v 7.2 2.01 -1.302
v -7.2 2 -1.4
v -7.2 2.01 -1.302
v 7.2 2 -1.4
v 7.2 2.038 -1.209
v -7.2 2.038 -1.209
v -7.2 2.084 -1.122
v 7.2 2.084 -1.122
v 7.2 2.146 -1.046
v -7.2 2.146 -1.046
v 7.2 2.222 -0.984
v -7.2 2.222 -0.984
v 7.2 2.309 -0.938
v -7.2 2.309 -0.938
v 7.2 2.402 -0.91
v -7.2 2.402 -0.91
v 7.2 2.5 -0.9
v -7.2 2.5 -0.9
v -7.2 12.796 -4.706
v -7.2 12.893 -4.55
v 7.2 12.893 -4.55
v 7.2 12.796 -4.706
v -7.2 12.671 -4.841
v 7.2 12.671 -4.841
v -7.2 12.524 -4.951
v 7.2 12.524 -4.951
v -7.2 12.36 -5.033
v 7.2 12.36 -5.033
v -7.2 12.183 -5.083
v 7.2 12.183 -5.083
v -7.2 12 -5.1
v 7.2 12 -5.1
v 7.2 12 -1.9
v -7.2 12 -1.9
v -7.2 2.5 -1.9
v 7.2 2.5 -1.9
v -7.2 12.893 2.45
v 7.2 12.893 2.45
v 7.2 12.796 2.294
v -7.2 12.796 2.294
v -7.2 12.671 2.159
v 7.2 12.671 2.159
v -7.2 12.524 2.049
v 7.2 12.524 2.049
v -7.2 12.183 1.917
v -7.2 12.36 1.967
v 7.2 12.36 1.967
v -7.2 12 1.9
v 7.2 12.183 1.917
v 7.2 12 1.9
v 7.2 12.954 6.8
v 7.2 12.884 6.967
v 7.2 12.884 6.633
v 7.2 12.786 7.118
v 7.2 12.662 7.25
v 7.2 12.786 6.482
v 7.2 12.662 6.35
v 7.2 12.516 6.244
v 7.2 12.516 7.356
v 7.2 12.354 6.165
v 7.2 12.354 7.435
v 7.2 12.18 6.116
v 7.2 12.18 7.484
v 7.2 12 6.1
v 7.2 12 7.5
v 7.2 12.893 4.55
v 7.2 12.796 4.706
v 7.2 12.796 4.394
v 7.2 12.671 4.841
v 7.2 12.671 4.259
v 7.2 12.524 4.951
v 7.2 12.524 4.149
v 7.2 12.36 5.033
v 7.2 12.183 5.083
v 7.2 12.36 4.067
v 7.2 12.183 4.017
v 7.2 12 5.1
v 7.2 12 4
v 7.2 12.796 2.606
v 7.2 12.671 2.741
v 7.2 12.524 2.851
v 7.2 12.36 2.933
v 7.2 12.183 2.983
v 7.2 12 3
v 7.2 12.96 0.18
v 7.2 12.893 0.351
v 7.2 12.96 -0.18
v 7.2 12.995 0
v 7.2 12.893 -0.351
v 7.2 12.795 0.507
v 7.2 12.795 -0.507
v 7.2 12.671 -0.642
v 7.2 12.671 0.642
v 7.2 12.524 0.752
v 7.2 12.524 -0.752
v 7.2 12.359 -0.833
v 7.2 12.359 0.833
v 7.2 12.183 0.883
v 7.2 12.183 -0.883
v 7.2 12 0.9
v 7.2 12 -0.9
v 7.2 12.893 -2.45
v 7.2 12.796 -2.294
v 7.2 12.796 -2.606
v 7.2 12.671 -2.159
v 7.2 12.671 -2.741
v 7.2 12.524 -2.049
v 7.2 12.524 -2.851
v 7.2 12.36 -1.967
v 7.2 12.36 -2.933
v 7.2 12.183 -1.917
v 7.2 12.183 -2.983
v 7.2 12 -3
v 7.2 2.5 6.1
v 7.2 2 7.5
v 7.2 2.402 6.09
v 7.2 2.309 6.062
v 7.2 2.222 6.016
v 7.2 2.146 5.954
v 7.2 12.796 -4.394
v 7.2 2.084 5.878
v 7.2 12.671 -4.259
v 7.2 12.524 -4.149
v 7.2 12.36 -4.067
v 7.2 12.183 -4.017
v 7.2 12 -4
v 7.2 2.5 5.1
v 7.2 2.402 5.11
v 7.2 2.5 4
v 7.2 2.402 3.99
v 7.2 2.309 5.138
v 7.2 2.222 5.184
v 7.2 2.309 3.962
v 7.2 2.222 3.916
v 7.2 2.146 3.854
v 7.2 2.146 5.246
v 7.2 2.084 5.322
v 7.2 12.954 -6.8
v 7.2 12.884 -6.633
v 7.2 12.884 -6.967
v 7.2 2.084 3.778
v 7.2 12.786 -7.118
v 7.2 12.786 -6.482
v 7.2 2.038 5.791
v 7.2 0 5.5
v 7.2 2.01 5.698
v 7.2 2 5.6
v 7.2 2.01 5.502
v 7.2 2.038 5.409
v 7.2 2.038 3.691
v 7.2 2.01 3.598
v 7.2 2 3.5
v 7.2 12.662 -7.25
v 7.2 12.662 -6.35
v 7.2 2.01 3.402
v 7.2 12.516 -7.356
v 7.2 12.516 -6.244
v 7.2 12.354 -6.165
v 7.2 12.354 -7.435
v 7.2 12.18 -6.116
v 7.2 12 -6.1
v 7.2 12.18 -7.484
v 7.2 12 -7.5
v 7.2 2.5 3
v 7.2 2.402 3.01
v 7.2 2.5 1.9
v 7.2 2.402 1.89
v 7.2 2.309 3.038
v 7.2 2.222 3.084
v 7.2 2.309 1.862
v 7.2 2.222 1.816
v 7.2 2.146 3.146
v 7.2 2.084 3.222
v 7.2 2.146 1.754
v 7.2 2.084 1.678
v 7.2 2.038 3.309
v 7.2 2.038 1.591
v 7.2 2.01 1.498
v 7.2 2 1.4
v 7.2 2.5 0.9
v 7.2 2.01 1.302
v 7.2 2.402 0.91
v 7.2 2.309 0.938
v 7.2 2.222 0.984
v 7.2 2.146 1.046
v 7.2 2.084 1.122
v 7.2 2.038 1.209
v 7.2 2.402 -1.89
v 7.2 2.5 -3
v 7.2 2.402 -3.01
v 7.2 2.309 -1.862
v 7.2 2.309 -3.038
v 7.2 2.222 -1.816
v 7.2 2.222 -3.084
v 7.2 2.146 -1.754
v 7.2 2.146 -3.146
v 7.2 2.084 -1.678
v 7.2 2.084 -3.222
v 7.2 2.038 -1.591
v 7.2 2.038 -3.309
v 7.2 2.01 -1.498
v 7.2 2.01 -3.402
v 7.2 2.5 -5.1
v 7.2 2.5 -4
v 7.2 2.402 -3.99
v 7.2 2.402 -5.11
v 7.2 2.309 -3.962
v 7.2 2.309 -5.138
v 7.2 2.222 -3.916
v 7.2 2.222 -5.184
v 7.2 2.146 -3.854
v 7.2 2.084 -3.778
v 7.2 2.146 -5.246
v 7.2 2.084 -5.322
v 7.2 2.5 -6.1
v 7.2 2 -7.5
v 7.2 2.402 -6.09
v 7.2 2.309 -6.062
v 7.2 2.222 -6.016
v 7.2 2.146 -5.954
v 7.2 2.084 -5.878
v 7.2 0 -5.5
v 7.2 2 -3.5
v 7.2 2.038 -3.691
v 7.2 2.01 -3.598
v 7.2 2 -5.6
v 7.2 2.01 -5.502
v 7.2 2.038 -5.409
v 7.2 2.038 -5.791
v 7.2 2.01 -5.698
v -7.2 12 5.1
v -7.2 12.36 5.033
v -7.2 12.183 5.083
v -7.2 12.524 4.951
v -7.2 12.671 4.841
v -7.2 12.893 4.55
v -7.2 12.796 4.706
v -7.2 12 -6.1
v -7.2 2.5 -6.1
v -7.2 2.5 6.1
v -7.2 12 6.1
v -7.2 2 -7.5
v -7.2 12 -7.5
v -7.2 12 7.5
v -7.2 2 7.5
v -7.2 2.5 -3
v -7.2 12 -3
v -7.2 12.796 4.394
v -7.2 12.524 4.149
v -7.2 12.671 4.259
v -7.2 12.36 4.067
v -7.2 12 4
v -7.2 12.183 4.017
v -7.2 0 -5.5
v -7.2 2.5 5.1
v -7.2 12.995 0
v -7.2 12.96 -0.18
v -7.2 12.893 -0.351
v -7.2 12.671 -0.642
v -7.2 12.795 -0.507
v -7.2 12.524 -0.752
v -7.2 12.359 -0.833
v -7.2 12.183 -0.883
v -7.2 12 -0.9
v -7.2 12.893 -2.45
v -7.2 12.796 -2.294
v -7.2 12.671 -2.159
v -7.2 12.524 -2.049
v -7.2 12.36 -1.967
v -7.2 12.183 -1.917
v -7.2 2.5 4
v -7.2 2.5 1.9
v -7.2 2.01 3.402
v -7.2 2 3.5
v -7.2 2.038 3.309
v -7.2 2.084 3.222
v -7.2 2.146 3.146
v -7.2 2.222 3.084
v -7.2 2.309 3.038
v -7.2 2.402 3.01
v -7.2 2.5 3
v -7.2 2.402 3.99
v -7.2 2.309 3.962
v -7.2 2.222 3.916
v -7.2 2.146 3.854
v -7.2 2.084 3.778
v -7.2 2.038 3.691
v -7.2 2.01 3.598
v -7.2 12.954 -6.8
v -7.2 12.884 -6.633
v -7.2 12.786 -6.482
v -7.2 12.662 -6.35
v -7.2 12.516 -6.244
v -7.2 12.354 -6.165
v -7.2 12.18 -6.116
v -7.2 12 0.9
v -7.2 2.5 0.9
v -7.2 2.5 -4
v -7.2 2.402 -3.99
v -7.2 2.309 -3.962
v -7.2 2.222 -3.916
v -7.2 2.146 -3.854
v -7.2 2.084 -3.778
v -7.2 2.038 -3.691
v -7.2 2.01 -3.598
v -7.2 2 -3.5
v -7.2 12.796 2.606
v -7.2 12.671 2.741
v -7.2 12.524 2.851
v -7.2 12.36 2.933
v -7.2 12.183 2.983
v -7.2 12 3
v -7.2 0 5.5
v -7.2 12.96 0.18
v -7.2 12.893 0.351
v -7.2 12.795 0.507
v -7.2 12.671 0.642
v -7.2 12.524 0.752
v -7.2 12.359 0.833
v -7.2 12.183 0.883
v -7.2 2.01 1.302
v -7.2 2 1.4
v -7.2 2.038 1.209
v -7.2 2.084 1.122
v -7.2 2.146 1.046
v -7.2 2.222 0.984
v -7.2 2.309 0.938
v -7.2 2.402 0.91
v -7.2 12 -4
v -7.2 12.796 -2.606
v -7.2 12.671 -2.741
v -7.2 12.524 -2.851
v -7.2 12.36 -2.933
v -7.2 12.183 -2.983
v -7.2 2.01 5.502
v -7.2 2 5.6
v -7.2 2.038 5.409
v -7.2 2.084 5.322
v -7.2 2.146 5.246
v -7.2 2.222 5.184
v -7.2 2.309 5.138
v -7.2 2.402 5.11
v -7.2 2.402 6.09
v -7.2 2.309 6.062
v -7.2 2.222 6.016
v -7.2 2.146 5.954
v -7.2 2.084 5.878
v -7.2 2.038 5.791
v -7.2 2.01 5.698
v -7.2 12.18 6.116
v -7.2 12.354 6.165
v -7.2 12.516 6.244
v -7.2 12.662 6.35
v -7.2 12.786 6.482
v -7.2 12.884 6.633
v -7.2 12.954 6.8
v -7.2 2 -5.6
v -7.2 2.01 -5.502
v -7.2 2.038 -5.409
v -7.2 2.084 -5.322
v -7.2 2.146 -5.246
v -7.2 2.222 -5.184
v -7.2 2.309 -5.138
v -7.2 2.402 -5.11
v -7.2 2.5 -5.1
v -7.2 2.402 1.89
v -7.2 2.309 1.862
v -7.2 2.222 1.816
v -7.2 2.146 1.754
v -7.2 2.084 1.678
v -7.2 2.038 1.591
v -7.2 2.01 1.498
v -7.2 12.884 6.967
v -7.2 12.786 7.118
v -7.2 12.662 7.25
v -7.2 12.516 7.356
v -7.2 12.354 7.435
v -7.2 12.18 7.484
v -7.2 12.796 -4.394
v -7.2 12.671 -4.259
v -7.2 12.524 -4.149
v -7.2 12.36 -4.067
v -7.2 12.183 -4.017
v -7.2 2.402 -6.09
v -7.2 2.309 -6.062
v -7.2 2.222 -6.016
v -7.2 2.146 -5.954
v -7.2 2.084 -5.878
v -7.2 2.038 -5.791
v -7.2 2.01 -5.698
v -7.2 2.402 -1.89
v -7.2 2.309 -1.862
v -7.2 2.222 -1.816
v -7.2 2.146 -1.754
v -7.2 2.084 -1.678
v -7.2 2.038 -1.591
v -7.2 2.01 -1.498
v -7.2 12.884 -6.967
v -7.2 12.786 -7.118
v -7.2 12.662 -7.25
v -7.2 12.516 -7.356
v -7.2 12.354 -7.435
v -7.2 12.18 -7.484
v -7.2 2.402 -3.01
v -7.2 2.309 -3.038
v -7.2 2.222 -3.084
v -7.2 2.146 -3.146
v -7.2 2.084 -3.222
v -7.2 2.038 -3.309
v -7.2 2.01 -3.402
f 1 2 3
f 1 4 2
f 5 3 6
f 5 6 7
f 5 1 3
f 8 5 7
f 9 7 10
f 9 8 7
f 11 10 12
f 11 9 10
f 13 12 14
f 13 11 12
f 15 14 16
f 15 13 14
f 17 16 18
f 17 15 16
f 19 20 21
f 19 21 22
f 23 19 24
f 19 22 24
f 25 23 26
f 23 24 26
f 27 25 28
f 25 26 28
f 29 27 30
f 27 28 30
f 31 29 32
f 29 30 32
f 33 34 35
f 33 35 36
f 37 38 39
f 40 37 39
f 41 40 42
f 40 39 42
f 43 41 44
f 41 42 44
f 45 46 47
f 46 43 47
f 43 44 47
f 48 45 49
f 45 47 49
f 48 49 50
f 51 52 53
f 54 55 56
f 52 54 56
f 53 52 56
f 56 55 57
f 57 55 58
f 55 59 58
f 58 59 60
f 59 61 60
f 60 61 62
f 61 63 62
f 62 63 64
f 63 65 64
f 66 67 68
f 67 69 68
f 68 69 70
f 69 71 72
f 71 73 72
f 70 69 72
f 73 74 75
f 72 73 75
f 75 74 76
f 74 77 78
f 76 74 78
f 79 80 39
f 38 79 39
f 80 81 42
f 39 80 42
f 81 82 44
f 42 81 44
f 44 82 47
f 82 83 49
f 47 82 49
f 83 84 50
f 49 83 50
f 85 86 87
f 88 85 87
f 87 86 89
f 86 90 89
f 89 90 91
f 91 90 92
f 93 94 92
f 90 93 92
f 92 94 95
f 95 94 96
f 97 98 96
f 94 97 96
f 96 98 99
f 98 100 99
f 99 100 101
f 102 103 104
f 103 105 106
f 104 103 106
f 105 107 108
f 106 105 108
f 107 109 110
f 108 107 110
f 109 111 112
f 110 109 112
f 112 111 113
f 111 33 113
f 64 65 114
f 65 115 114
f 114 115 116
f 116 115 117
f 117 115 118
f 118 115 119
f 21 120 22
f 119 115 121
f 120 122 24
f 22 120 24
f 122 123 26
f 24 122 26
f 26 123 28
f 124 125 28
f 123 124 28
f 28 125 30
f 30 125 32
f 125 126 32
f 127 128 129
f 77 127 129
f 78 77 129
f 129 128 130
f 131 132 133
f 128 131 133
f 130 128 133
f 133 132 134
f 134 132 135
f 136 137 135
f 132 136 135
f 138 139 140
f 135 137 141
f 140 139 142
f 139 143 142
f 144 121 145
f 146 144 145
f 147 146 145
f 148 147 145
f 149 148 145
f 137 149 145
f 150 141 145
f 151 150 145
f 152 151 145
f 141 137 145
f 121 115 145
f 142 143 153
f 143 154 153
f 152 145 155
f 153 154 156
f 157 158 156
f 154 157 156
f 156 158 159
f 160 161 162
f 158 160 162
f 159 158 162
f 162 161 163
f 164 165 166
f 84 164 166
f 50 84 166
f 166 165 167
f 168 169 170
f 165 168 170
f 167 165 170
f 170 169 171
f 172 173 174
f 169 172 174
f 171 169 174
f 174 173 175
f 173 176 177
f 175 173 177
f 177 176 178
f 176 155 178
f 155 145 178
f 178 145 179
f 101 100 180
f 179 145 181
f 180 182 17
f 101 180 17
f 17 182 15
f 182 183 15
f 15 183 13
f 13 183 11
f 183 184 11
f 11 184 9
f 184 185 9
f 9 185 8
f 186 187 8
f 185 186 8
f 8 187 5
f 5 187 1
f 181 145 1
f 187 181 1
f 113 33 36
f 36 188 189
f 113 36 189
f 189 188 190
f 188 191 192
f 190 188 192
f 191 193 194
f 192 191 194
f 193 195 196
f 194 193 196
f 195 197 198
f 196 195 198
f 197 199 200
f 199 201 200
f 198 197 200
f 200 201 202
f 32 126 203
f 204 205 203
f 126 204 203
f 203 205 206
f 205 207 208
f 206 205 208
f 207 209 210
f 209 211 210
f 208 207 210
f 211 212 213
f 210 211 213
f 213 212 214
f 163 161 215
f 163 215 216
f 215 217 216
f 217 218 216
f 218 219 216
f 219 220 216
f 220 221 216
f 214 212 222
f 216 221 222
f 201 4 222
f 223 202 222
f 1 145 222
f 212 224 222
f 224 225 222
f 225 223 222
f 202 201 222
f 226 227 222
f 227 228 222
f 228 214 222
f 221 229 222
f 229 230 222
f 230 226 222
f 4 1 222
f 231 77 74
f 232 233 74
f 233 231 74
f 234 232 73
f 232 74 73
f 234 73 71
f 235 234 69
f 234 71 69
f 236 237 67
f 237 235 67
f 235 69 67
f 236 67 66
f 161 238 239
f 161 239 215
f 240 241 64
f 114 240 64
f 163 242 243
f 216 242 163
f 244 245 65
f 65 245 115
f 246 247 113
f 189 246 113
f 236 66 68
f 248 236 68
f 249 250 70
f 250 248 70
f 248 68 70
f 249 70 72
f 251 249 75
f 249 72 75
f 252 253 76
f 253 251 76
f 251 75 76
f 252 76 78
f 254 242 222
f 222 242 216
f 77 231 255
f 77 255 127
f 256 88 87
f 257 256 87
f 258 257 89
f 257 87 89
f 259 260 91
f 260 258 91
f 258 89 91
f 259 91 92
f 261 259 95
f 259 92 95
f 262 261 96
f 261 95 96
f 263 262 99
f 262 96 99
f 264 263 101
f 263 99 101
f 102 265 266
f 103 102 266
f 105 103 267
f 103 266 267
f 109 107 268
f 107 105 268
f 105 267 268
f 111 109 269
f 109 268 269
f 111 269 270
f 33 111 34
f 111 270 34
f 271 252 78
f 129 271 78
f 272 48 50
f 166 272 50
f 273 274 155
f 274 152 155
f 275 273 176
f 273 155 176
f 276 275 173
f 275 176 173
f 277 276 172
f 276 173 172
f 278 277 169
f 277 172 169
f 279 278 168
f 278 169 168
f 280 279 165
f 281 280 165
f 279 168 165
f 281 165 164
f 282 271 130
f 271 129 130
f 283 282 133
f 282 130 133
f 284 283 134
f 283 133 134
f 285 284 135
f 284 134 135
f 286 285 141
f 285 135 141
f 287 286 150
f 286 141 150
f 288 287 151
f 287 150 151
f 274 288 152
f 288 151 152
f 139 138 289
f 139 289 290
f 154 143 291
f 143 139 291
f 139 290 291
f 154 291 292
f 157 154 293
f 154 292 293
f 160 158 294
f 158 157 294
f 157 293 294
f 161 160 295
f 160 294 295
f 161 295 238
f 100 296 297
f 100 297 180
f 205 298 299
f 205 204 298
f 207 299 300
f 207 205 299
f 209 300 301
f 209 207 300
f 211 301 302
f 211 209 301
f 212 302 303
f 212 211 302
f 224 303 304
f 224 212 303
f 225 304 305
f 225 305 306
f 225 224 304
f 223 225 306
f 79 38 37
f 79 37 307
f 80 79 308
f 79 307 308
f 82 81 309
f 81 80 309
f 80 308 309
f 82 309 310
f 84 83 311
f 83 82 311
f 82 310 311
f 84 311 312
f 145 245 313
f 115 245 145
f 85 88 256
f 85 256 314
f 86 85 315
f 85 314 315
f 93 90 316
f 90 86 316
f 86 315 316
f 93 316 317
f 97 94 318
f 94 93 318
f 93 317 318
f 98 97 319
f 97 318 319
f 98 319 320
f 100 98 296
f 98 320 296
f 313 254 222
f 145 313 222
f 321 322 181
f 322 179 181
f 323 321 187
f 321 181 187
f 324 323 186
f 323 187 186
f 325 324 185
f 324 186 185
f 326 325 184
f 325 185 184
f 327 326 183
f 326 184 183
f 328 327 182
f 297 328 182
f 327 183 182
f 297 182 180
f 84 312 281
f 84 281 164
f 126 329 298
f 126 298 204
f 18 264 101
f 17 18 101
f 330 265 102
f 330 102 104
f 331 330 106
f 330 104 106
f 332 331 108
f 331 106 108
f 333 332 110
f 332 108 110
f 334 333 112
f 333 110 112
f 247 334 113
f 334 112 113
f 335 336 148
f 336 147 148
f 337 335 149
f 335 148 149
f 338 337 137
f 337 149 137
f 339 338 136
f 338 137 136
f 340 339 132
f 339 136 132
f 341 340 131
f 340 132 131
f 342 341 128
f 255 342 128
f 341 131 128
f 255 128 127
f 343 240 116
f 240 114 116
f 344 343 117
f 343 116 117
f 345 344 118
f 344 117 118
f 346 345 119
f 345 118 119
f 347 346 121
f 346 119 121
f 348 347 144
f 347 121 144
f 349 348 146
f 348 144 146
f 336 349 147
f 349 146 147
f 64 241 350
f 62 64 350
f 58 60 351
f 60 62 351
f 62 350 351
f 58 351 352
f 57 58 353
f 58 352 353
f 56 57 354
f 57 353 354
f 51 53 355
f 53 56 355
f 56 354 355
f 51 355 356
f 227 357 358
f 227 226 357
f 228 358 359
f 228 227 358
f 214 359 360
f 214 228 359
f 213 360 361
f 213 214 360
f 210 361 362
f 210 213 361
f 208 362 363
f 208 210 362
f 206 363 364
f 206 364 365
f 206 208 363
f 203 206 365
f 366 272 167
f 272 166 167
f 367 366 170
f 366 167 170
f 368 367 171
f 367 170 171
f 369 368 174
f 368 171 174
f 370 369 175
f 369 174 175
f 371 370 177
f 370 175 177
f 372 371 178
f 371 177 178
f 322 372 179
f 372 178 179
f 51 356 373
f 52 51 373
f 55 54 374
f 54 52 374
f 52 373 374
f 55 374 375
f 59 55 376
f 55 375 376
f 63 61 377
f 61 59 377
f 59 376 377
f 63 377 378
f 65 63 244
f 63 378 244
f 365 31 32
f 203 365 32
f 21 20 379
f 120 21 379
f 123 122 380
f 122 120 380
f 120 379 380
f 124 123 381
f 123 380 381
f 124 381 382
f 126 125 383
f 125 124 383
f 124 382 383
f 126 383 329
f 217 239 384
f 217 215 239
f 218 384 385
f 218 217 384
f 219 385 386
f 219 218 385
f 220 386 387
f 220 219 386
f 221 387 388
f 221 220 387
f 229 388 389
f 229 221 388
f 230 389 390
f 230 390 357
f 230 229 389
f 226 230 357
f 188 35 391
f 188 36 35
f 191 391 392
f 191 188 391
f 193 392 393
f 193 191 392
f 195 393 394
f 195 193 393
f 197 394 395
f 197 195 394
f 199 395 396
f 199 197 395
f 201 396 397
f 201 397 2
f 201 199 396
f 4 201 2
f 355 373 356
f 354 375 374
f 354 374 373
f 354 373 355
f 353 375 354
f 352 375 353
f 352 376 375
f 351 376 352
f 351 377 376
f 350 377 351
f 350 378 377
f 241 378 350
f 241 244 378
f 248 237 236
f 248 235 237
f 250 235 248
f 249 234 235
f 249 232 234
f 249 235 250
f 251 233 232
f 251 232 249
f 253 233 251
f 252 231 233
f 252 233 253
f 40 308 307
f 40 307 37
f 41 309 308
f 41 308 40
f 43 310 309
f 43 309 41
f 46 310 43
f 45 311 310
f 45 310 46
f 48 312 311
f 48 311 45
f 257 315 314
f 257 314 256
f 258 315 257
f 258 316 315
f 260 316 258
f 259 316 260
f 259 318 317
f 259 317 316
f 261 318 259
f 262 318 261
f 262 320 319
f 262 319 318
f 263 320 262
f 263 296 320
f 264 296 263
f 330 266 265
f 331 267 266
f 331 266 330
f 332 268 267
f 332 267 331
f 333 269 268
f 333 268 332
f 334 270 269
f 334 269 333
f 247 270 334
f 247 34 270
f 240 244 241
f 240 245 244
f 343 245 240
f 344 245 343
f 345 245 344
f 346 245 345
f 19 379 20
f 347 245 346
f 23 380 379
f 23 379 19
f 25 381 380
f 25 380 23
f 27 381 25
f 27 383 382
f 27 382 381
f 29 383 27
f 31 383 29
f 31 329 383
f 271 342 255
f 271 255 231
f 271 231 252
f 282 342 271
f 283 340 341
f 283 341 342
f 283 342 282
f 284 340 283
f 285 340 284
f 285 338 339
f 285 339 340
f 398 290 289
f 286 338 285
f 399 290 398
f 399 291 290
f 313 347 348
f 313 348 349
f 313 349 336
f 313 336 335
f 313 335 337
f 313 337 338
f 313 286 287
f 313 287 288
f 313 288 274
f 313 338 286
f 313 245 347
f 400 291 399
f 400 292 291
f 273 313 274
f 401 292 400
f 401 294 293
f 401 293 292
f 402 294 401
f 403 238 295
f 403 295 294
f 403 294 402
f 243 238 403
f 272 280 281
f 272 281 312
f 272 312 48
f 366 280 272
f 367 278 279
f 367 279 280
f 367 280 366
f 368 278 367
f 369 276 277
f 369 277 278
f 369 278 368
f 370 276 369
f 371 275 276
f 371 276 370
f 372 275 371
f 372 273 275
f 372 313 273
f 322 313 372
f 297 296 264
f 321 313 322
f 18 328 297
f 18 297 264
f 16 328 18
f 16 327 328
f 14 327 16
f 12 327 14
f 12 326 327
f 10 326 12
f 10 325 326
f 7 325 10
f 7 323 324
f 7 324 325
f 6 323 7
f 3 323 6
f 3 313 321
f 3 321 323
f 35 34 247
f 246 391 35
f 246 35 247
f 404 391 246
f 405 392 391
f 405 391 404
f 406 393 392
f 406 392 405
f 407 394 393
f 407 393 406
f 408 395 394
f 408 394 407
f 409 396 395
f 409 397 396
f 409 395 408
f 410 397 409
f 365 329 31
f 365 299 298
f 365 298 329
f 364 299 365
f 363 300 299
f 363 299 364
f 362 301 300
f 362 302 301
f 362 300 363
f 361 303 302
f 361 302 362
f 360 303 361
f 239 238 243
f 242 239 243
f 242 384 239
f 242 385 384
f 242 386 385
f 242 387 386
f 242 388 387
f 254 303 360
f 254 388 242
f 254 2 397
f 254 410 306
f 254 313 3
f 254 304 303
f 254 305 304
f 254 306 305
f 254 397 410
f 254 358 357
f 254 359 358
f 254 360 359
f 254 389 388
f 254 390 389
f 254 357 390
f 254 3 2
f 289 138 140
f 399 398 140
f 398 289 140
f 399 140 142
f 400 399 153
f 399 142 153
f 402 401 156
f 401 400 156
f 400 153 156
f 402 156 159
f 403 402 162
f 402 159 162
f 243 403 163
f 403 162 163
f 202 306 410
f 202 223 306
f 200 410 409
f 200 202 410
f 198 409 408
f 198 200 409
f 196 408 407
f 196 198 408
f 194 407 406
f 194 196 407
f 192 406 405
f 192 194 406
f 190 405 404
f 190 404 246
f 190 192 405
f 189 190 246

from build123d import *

# Parameters (mm, degrees)
SKIZZE1_W                       = 14.4
SKIZZE1_H                       = 15
AUFSATZ_LINEAR_AUSTRAGEN1_DEPTH = 13
SKIZZE2_W                       = 14.4
SKIZZE2_H                       = 1
SCHNITT_LINEAR_AUSTRAGEN1_DEPTH = 11
VERRUNDUNG1_R                   = 1
FASE1_SIZE                      = 2
VERRUNDUNG3_R                   = 0.5


# Some blends are built 0.0001 mm under size
with BuildPart() as part:
    # Skizze1 → Aufsatz-Linear austragen1 (new body)
    with BuildSketch(Plane(origin=(0, 0, 0), x_dir=(1, 0, 0), z_dir=(0, 1, 0))):
        Rectangle(SKIZZE1_W, SKIZZE1_H)
    extrude(amount=AUFSATZ_LINEAR_AUSTRAGEN1_DEPTH)

    # Skizze2 → Schnitt-Linear austragen1 (cut)
    with BuildSketch(Plane(origin=(0, 13, 0), x_dir=(1, 0, 0), z_dir=(0, 1, 0))):
        with Locations((0, -5.6)):
            Rectangle(SKIZZE2_W, SKIZZE2_H)
        with Locations((0, -3.5)):
            Rectangle(SKIZZE2_W, SKIZZE2_H)
        with Locations((0, -1.4)):
            Rectangle(SKIZZE2_W, SKIZZE2_H)
        with Locations((0, 1.4)):
            Rectangle(SKIZZE2_W, SKIZZE2_H)
        with Locations((0, 3.5)):
            Rectangle(SKIZZE2_W, SKIZZE2_H)
        with Locations((0, 5.6)):
            Rectangle(SKIZZE2_W, SKIZZE2_H)
    extrude(amount=-SCHNITT_LINEAR_AUSTRAGEN1_DEPTH, mode=Mode.SUBTRACT)

    # Verrundung1
    # the kernel refuses this fillet: 1 mm, written as the material it takes off along each edge
    with BuildSketch(Plane(origin=(-9.7, 13, 7.5), x_dir=(0, -1, 0), z_dir=(1, 0, 0)), Plane(origin=(-9.7, 13, 6.1), x_dir=(0, 0, 1), z_dir=(1, 0, 0)), Plane(origin=(-9.7, 13, 3), x_dir=(0, -1, 0), z_dir=(1, 0, 0)), Plane(origin=(-9.7, 13, 0.9), x_dir=(0, -1, 0), z_dir=(1, 0, 0)), Plane(origin=(-9.7, 13, -1.9), x_dir=(0, -1, 0), z_dir=(1, 0, 0)), Plane(origin=(-9.7, 13, -4), x_dir=(0, -1, 0), z_dir=(1, 0, 0)), Plane(origin=(-9.7, 13, -6.1), x_dir=(0, -1, 0), z_dir=(1, 0, 0))) as verrundung1_piece_1:
        with BuildLine():
            CenterArc((VERRUNDUNG1_R, VERRUNDUNG1_R), VERRUNDUNG1_R, 180, 90)
            Line((0, VERRUNDUNG1_R), (0, 0))
            Line((0, 0), (VERRUNDUNG1_R, 0))
        make_face()
    extrude(amount=19.4, mode=Mode.SUBTRACT)
    with BuildSketch(Plane(origin=(9.7, 13, 5.1), x_dir=(0, -1, 0), z_dir=(-1, 0, 0)), Plane(origin=(9.7, 13, 4), x_dir=(0, 0, 1), z_dir=(-1, 0, 0)), Plane(origin=(9.7, 13, 1.9), x_dir=(0, 0, 1), z_dir=(-1, 0, 0)), Plane(origin=(9.7, 13, -0.9), x_dir=(0, 0, 1), z_dir=(-1, 0, 0)), Plane(origin=(9.7, 13, -3), x_dir=(0, 0, 1), z_dir=(-1, 0, 0)), Plane(origin=(9.7, 13, -5.1), x_dir=(0, 0, 1), z_dir=(-1, 0, 0)), Plane(origin=(9.7, 13, -7.5), x_dir=(0, 0, 1), z_dir=(-1, 0, 0))) as verrundung1_piece_2:
        with BuildLine():
            CenterArc((VERRUNDUNG1_R, -VERRUNDUNG1_R), VERRUNDUNG1_R, 90, 90)
            Line((0, -VERRUNDUNG1_R), (0, 0))
            Line((0, 0), (VERRUNDUNG1_R, 0))
        make_face()
    extrude(amount=19.4, mode=Mode.SUBTRACT)

    # Fase1
    fase1_edges = [part.edges().sort_by_distance(p)[0] for p in [
        (0, 0, 7.5),
        (0, 0, -7.5),
    ]]
    chamfer(fase1_edges, length=FASE1_SIZE)

    # Verrundung3
    verrundung3_edges = [part.edges().sort_by_distance(p)[0] for p in [
        (0, 2, -5.1),
        (0, 2, -3),
        (0, 2, -0.9),
        (0, 2, 1.9),
        (0, 2, 4),
        (0, 2, 6.1),
        (0, 2, 5.1),
        (0, 2, 3),
        (0, 2, 0.9),
        (0, 2, -1.9),
        (0, 2, -4),
        (0, 2, -6.1),
    ]]
    fillet(verrundung3_edges, radius=VERRUNDUNG3_R - 0.0001)  # a hair under: the kernel refuses the full size


solid = part.part
